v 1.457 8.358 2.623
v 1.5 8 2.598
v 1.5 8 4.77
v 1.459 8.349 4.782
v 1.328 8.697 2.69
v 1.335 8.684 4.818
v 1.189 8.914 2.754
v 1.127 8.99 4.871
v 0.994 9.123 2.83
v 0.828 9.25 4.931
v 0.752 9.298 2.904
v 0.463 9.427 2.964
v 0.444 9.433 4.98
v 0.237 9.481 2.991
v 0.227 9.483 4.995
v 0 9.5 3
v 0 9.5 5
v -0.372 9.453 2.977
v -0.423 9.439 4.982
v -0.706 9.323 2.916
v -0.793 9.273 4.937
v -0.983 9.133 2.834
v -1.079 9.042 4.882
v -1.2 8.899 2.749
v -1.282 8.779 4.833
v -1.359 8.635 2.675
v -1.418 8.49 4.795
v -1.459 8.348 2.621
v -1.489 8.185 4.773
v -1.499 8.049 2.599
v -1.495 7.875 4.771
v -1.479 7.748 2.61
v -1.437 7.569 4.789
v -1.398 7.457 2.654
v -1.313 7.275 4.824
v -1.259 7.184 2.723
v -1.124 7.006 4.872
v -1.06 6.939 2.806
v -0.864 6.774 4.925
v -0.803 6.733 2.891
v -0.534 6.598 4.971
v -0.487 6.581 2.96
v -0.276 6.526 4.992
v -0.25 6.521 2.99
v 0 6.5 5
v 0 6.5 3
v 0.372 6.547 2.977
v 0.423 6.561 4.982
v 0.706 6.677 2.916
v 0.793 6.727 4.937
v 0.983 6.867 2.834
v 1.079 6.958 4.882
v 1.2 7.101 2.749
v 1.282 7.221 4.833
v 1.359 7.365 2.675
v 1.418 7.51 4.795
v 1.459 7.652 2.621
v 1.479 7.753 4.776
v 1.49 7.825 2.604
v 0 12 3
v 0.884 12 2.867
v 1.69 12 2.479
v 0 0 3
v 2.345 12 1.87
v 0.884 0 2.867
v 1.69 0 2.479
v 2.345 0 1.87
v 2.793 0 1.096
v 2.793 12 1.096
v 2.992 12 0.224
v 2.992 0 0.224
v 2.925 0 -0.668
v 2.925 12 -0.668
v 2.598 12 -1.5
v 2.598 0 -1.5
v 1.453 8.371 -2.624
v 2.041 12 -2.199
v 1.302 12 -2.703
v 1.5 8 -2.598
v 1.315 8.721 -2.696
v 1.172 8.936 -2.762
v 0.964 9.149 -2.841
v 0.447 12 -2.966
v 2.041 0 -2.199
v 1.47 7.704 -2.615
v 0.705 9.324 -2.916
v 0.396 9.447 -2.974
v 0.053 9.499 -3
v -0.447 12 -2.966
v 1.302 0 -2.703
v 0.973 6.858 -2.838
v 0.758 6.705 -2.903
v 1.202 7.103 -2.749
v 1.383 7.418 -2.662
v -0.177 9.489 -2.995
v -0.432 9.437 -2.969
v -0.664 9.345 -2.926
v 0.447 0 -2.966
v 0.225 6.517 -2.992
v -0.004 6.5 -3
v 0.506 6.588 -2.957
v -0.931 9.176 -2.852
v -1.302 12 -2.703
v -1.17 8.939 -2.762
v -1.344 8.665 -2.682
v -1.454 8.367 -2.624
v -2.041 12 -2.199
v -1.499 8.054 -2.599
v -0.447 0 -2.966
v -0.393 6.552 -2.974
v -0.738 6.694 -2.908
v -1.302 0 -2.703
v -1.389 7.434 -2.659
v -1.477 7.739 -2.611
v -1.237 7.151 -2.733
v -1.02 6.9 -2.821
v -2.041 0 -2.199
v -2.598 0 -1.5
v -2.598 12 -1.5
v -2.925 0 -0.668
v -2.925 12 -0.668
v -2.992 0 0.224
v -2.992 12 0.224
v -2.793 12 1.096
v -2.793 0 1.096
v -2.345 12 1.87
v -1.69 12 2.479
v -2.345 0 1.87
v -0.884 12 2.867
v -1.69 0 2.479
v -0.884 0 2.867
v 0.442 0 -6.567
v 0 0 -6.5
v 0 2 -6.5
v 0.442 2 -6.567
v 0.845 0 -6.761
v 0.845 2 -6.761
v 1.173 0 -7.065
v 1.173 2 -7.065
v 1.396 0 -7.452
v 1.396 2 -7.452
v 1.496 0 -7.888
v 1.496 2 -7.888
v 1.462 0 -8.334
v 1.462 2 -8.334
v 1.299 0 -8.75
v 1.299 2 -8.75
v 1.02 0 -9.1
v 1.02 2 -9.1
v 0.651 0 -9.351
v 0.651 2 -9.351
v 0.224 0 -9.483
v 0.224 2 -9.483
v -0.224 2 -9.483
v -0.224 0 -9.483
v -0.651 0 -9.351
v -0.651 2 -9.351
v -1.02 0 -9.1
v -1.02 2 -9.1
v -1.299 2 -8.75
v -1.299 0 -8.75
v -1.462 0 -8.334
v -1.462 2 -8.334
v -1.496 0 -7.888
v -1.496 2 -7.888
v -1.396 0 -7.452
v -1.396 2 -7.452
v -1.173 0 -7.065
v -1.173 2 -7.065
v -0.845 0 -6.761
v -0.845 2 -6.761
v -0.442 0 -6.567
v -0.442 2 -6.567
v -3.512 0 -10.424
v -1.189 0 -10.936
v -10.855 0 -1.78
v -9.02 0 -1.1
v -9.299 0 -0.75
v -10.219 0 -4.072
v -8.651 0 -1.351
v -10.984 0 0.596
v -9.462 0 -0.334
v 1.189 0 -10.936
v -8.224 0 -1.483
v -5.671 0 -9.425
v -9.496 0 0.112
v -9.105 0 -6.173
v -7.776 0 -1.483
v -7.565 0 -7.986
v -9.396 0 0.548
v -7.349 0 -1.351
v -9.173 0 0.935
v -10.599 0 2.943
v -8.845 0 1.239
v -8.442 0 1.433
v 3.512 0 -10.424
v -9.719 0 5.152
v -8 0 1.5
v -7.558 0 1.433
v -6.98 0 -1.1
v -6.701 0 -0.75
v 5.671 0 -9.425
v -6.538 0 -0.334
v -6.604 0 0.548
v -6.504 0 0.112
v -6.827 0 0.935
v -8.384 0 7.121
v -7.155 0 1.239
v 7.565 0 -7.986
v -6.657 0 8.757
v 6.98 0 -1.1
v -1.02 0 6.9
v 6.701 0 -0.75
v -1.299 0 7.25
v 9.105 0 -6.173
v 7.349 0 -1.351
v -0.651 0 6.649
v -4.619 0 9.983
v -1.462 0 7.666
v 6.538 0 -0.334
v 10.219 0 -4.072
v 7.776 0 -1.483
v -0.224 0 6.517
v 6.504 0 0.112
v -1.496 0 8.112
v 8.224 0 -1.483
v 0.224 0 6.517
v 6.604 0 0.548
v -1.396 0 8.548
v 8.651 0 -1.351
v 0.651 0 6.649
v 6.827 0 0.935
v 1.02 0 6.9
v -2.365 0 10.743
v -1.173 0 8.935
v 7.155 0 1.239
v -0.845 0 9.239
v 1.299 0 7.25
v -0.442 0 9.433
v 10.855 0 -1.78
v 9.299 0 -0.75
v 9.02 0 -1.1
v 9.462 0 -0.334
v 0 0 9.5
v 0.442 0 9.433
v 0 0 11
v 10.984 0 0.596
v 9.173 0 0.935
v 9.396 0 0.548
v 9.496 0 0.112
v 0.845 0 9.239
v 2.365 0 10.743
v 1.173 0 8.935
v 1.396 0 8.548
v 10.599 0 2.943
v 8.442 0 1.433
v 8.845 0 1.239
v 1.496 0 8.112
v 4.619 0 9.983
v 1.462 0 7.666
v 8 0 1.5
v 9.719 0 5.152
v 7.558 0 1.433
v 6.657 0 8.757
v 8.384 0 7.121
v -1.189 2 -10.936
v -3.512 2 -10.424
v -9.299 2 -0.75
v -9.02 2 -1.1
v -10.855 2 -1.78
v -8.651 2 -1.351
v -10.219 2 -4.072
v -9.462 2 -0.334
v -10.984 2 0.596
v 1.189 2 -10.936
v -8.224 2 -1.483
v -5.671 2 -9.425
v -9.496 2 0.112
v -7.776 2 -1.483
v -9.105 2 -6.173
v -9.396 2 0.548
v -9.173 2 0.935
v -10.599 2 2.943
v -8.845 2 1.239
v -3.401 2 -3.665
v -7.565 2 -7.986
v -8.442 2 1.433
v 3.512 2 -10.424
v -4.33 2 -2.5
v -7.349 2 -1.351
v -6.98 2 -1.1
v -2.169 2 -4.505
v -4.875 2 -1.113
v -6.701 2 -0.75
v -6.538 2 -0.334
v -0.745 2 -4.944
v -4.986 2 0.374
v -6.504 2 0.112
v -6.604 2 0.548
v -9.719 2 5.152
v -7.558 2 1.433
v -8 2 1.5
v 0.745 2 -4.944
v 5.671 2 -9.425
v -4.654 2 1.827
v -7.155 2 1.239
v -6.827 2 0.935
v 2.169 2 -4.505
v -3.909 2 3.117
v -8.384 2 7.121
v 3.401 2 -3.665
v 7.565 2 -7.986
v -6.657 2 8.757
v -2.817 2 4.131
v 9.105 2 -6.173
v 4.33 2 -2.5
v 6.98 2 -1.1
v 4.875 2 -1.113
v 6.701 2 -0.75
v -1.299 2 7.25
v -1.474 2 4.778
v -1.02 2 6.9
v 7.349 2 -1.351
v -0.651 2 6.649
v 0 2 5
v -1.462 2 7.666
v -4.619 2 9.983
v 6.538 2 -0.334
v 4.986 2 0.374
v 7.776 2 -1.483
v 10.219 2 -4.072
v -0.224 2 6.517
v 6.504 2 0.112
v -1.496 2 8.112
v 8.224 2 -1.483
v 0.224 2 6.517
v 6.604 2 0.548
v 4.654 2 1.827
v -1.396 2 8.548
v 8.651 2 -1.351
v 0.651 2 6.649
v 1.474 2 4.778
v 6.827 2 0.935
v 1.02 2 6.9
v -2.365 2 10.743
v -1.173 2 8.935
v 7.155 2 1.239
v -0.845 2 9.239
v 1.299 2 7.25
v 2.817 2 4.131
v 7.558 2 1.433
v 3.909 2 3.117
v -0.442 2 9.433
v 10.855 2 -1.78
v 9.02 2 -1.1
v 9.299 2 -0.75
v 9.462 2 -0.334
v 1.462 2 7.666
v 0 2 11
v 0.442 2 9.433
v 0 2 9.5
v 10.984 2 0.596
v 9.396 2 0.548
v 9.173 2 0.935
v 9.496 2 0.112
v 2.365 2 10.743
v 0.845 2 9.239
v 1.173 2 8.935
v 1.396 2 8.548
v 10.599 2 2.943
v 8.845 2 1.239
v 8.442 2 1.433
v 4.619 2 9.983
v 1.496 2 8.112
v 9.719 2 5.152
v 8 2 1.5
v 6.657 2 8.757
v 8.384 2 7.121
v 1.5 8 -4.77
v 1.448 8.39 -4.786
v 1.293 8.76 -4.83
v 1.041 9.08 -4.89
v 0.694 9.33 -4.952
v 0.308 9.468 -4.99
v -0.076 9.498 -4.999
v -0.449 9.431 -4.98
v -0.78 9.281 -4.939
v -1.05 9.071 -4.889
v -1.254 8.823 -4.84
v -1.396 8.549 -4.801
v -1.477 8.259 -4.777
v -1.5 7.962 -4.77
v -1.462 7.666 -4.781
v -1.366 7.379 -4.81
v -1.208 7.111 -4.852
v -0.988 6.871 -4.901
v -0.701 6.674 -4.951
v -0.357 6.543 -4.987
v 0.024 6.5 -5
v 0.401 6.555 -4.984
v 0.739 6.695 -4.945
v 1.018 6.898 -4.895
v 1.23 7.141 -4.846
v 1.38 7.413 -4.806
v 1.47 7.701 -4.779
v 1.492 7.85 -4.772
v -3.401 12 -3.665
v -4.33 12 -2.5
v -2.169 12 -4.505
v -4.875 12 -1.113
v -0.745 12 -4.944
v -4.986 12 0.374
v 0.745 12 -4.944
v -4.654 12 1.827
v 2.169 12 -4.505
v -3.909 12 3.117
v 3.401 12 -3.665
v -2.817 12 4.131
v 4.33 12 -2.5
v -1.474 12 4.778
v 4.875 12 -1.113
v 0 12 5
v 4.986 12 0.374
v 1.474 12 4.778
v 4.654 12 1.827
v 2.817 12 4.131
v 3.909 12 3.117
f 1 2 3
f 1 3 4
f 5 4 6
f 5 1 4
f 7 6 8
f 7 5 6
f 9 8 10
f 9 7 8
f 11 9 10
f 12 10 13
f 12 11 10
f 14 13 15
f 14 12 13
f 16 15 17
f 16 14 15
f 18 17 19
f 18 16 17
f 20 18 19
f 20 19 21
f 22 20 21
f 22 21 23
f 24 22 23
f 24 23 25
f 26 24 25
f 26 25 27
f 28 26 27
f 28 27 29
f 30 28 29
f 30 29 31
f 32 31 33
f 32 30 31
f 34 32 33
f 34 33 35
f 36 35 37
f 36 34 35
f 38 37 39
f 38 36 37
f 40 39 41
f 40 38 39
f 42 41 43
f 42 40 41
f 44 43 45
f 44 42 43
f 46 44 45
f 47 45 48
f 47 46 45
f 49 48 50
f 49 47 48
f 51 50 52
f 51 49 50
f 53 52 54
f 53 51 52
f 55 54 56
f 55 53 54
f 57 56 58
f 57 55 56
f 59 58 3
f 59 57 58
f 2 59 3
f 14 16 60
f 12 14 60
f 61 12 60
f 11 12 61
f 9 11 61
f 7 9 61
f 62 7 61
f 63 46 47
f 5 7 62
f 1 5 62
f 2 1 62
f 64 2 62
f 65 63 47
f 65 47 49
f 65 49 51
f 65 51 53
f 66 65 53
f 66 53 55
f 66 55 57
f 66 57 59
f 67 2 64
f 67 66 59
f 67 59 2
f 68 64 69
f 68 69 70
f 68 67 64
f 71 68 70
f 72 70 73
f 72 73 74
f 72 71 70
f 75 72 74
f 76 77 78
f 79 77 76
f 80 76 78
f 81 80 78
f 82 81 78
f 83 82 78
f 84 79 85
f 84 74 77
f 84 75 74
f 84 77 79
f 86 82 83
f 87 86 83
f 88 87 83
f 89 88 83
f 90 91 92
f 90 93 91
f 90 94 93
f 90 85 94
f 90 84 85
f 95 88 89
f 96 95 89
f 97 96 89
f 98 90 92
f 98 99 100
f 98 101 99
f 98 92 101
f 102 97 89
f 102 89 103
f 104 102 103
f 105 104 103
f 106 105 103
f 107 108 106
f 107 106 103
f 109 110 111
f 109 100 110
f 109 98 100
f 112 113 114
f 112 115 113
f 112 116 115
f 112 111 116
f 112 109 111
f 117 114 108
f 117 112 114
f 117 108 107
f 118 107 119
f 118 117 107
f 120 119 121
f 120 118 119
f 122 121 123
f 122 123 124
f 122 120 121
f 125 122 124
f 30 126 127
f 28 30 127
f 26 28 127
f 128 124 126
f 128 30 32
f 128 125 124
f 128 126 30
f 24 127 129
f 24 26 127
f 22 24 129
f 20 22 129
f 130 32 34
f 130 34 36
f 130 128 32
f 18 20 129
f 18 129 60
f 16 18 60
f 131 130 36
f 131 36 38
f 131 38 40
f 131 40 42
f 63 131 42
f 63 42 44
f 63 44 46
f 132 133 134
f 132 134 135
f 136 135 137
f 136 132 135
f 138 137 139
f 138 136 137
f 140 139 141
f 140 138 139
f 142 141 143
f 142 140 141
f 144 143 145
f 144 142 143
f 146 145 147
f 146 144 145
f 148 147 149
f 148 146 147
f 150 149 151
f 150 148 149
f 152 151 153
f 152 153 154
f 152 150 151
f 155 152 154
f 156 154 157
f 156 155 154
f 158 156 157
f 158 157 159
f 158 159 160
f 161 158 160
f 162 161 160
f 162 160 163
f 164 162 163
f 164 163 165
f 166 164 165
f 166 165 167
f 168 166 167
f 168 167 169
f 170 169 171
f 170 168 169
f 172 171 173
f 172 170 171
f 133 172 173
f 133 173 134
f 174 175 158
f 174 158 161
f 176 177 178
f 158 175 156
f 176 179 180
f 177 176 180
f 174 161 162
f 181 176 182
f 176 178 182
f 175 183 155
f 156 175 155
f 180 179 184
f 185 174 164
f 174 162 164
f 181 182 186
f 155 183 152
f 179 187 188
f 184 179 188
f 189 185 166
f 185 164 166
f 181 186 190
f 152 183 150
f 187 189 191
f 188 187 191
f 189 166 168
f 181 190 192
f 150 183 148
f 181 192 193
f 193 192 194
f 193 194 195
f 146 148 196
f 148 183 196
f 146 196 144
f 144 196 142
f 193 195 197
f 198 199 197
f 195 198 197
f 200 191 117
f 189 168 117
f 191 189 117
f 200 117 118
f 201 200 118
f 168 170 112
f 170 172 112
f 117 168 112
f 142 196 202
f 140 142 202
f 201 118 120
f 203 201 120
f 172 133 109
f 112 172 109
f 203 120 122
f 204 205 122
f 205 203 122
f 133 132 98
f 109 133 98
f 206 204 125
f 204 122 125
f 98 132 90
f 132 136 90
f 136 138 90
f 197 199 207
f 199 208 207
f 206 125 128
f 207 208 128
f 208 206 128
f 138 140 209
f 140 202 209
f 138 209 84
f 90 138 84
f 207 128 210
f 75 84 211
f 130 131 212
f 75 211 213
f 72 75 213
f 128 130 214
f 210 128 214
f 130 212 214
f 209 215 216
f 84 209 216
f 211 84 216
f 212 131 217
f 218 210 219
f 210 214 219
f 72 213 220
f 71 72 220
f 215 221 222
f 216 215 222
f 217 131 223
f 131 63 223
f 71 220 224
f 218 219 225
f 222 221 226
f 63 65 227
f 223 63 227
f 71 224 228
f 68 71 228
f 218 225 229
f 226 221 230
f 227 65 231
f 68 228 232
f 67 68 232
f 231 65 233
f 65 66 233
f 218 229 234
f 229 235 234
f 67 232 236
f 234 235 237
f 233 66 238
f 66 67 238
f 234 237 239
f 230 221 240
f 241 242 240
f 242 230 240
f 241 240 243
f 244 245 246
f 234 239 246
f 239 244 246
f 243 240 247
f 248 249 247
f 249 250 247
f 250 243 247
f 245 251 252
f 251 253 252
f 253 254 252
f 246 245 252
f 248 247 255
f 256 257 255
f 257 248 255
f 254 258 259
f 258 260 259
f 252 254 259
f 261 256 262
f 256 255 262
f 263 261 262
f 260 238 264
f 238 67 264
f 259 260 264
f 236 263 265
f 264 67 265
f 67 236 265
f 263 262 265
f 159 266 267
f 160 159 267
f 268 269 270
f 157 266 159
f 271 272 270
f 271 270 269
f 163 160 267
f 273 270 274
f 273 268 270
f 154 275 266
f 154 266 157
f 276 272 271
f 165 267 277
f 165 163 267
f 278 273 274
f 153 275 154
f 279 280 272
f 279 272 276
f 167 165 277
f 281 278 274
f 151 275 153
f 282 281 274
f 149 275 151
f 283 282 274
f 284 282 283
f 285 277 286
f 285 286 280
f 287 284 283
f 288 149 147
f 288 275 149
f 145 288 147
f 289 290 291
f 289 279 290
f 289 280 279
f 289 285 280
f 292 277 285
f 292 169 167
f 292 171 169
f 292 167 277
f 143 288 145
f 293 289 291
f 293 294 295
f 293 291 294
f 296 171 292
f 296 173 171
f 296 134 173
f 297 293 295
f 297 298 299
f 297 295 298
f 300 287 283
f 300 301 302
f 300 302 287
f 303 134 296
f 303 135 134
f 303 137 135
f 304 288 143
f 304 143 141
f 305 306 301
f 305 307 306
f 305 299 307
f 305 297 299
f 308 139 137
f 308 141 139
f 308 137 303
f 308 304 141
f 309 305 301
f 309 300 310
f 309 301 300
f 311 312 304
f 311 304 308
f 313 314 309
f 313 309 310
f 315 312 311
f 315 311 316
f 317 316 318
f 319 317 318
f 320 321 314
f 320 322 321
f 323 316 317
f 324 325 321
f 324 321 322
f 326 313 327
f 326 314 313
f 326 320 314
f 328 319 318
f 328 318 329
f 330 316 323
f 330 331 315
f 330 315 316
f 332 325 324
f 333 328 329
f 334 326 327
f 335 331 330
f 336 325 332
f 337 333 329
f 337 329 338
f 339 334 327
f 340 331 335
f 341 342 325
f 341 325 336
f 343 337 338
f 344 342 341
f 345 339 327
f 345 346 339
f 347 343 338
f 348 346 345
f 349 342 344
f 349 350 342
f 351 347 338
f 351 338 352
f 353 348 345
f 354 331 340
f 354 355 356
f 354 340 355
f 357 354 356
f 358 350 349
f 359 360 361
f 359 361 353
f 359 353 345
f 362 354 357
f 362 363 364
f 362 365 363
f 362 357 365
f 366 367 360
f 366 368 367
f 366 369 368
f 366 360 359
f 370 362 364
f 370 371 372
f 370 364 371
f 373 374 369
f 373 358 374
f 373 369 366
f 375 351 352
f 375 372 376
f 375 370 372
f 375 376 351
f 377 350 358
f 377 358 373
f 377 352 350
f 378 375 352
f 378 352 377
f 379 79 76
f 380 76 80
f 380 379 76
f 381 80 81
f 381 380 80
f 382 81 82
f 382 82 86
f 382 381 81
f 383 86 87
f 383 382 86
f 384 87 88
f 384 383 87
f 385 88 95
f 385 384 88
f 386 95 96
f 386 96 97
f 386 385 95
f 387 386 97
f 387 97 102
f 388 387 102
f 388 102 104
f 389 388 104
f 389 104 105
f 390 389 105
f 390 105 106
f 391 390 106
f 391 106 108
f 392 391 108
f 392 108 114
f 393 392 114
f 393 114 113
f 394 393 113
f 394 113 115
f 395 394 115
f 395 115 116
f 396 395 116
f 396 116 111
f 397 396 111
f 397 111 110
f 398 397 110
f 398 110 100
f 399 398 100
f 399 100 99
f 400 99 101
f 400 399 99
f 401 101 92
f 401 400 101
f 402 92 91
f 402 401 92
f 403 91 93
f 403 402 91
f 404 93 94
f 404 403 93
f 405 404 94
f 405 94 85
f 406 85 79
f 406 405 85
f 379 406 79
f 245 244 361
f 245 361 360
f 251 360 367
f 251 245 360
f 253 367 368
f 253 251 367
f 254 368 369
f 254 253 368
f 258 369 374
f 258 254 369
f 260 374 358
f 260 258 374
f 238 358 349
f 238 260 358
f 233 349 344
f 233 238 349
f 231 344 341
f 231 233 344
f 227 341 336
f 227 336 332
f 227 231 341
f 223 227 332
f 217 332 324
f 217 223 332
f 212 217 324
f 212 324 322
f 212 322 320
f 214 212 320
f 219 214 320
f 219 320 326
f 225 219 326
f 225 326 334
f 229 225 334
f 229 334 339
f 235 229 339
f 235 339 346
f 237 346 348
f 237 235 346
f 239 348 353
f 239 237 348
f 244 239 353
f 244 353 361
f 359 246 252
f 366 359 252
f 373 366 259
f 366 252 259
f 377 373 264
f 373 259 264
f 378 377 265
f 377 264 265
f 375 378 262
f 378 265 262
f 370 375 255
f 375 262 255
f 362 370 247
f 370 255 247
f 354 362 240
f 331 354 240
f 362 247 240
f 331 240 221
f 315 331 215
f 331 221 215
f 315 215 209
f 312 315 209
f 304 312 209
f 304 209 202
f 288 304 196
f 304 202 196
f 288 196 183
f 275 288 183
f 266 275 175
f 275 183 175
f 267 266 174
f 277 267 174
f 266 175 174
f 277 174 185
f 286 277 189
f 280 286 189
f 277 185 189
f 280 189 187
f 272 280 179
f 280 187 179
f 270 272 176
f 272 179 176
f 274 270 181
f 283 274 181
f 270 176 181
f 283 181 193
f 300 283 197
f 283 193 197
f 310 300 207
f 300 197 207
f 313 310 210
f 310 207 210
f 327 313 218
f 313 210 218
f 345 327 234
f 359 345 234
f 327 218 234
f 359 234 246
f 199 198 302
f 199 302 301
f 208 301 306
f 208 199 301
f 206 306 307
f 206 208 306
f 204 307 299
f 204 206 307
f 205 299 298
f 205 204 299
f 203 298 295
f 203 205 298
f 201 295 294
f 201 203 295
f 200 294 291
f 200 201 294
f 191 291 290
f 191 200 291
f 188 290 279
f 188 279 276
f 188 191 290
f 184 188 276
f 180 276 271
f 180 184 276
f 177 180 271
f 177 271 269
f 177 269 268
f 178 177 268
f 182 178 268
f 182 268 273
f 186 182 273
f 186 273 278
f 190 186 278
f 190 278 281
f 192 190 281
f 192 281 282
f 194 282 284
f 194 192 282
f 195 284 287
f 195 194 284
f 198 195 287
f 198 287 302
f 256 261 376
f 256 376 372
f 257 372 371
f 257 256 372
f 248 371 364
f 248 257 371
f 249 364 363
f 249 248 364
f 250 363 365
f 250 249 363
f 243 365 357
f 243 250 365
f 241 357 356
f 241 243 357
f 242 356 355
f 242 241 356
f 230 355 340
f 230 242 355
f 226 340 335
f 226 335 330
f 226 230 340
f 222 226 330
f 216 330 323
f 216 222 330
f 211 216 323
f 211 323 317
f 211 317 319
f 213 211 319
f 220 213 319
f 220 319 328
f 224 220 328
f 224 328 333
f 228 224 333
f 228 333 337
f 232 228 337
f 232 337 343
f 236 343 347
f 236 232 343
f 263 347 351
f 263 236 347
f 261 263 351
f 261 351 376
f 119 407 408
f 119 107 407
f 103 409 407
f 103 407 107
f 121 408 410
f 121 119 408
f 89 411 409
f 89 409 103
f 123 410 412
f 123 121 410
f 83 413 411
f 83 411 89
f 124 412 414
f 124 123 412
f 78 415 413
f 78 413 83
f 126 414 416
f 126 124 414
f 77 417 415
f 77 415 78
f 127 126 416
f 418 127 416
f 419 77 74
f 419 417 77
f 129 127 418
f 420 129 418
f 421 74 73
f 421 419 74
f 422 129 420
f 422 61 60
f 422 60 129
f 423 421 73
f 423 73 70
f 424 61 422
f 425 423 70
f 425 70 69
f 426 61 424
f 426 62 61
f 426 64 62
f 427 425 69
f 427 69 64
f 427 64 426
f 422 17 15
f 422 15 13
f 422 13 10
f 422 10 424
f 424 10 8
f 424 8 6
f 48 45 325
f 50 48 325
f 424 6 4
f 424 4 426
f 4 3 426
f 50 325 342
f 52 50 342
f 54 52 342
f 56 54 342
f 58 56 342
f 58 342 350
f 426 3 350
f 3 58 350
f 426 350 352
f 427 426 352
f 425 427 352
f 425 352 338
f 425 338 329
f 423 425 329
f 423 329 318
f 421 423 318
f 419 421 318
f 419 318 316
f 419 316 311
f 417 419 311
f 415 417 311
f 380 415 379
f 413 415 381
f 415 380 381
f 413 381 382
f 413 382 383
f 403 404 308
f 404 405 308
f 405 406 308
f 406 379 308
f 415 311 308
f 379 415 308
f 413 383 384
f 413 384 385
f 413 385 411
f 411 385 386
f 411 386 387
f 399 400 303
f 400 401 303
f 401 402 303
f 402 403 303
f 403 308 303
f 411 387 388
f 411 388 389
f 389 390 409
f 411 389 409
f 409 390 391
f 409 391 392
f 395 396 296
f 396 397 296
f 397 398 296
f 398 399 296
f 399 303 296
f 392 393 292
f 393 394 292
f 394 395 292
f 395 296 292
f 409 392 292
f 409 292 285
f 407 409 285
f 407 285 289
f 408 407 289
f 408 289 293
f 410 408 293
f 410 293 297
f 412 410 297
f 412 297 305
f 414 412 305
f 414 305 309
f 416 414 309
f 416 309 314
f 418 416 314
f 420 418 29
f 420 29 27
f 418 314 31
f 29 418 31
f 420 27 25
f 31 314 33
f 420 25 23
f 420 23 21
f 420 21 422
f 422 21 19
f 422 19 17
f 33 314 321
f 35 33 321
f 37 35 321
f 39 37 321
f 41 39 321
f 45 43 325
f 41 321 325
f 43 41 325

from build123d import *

# Parameters (mm, degrees)
SKETCH1_R               = 11
SKETCH1_R_2             = 1.5
SKETCH1_R_3             = 3
BOSS_EXTRUDE1_DEPTH     = 2
SKETCH3_R               = 5
SKETCH3_R_2             = 3
BOSS_EXTRUDE3_DEPTH     = 10
CUT_EXTRUDE1_DEPTH      = 20.646882704
CUT_EXTRUDE1_DEPTH_BACK = 20.646882704
SKETCH4_R               = 1.5


with BuildPart() as part:
    # Sketch1 → Boss-Extrude1 (new body)
    with BuildSketch(Plane(origin=(0, 0, 0), x_dir=(1, 0, 0), z_dir=(0, 1, 0))):
        with Locations(Location((0, 0, 0), (0, 0, 270))):
            Circle(SKETCH1_R)
        with Locations(Location((8, 0, 0), (0, 0, 270))):
            Circle(SKETCH1_R_2, mode=Mode.SUBTRACT)
        with Locations(Location((0, -8, 0), (0, 0, 270))):
            Circle(SKETCH1_R_2, mode=Mode.SUBTRACT)
        with Locations(Location((-8, 0, 0), (0, 0, 270))):
            Circle(SKETCH1_R_2, mode=Mode.SUBTRACT)
        with Locations(Location((0, 8, 0), (0, 0, 270))):
            Circle(SKETCH1_R_2, mode=Mode.SUBTRACT)
        with Locations(Location((0, 0, 0), (0, 0, 270))):
            Circle(SKETCH1_R_3, mode=Mode.SUBTRACT)
    extrude(amount=BOSS_EXTRUDE1_DEPTH)

    # Sketch3 → Boss-Extrude3 (add)
    with BuildSketch(Plane(origin=(0, 2, 0), x_dir=(1, 0, 0), z_dir=(0, 1, 0))):
        with Locations(Location((0, 0, 0), (0, 0, 270))):
            Circle(SKETCH3_R)
        with Locations(Location((0, 0, 0), (0, 0, 270))):
            Circle(SKETCH3_R_2, mode=Mode.SUBTRACT)
    extrude(amount=BOSS_EXTRUDE3_DEPTH)

    # Sketch4 → Cut-Extrude1 (cut, two sides: drawn at the far end of the back side and taken through both)
    with BuildSketch(Plane.XY.offset(-CUT_EXTRUDE1_DEPTH_BACK)):
        with Locations((0, 8)):
            Circle(SKETCH4_R)
    extrude(amount=CUT_EXTRUDE1_DEPTH + CUT_EXTRUDE1_DEPTH_BACK, mode=Mode.SUBTRACT)


solid = part.part
